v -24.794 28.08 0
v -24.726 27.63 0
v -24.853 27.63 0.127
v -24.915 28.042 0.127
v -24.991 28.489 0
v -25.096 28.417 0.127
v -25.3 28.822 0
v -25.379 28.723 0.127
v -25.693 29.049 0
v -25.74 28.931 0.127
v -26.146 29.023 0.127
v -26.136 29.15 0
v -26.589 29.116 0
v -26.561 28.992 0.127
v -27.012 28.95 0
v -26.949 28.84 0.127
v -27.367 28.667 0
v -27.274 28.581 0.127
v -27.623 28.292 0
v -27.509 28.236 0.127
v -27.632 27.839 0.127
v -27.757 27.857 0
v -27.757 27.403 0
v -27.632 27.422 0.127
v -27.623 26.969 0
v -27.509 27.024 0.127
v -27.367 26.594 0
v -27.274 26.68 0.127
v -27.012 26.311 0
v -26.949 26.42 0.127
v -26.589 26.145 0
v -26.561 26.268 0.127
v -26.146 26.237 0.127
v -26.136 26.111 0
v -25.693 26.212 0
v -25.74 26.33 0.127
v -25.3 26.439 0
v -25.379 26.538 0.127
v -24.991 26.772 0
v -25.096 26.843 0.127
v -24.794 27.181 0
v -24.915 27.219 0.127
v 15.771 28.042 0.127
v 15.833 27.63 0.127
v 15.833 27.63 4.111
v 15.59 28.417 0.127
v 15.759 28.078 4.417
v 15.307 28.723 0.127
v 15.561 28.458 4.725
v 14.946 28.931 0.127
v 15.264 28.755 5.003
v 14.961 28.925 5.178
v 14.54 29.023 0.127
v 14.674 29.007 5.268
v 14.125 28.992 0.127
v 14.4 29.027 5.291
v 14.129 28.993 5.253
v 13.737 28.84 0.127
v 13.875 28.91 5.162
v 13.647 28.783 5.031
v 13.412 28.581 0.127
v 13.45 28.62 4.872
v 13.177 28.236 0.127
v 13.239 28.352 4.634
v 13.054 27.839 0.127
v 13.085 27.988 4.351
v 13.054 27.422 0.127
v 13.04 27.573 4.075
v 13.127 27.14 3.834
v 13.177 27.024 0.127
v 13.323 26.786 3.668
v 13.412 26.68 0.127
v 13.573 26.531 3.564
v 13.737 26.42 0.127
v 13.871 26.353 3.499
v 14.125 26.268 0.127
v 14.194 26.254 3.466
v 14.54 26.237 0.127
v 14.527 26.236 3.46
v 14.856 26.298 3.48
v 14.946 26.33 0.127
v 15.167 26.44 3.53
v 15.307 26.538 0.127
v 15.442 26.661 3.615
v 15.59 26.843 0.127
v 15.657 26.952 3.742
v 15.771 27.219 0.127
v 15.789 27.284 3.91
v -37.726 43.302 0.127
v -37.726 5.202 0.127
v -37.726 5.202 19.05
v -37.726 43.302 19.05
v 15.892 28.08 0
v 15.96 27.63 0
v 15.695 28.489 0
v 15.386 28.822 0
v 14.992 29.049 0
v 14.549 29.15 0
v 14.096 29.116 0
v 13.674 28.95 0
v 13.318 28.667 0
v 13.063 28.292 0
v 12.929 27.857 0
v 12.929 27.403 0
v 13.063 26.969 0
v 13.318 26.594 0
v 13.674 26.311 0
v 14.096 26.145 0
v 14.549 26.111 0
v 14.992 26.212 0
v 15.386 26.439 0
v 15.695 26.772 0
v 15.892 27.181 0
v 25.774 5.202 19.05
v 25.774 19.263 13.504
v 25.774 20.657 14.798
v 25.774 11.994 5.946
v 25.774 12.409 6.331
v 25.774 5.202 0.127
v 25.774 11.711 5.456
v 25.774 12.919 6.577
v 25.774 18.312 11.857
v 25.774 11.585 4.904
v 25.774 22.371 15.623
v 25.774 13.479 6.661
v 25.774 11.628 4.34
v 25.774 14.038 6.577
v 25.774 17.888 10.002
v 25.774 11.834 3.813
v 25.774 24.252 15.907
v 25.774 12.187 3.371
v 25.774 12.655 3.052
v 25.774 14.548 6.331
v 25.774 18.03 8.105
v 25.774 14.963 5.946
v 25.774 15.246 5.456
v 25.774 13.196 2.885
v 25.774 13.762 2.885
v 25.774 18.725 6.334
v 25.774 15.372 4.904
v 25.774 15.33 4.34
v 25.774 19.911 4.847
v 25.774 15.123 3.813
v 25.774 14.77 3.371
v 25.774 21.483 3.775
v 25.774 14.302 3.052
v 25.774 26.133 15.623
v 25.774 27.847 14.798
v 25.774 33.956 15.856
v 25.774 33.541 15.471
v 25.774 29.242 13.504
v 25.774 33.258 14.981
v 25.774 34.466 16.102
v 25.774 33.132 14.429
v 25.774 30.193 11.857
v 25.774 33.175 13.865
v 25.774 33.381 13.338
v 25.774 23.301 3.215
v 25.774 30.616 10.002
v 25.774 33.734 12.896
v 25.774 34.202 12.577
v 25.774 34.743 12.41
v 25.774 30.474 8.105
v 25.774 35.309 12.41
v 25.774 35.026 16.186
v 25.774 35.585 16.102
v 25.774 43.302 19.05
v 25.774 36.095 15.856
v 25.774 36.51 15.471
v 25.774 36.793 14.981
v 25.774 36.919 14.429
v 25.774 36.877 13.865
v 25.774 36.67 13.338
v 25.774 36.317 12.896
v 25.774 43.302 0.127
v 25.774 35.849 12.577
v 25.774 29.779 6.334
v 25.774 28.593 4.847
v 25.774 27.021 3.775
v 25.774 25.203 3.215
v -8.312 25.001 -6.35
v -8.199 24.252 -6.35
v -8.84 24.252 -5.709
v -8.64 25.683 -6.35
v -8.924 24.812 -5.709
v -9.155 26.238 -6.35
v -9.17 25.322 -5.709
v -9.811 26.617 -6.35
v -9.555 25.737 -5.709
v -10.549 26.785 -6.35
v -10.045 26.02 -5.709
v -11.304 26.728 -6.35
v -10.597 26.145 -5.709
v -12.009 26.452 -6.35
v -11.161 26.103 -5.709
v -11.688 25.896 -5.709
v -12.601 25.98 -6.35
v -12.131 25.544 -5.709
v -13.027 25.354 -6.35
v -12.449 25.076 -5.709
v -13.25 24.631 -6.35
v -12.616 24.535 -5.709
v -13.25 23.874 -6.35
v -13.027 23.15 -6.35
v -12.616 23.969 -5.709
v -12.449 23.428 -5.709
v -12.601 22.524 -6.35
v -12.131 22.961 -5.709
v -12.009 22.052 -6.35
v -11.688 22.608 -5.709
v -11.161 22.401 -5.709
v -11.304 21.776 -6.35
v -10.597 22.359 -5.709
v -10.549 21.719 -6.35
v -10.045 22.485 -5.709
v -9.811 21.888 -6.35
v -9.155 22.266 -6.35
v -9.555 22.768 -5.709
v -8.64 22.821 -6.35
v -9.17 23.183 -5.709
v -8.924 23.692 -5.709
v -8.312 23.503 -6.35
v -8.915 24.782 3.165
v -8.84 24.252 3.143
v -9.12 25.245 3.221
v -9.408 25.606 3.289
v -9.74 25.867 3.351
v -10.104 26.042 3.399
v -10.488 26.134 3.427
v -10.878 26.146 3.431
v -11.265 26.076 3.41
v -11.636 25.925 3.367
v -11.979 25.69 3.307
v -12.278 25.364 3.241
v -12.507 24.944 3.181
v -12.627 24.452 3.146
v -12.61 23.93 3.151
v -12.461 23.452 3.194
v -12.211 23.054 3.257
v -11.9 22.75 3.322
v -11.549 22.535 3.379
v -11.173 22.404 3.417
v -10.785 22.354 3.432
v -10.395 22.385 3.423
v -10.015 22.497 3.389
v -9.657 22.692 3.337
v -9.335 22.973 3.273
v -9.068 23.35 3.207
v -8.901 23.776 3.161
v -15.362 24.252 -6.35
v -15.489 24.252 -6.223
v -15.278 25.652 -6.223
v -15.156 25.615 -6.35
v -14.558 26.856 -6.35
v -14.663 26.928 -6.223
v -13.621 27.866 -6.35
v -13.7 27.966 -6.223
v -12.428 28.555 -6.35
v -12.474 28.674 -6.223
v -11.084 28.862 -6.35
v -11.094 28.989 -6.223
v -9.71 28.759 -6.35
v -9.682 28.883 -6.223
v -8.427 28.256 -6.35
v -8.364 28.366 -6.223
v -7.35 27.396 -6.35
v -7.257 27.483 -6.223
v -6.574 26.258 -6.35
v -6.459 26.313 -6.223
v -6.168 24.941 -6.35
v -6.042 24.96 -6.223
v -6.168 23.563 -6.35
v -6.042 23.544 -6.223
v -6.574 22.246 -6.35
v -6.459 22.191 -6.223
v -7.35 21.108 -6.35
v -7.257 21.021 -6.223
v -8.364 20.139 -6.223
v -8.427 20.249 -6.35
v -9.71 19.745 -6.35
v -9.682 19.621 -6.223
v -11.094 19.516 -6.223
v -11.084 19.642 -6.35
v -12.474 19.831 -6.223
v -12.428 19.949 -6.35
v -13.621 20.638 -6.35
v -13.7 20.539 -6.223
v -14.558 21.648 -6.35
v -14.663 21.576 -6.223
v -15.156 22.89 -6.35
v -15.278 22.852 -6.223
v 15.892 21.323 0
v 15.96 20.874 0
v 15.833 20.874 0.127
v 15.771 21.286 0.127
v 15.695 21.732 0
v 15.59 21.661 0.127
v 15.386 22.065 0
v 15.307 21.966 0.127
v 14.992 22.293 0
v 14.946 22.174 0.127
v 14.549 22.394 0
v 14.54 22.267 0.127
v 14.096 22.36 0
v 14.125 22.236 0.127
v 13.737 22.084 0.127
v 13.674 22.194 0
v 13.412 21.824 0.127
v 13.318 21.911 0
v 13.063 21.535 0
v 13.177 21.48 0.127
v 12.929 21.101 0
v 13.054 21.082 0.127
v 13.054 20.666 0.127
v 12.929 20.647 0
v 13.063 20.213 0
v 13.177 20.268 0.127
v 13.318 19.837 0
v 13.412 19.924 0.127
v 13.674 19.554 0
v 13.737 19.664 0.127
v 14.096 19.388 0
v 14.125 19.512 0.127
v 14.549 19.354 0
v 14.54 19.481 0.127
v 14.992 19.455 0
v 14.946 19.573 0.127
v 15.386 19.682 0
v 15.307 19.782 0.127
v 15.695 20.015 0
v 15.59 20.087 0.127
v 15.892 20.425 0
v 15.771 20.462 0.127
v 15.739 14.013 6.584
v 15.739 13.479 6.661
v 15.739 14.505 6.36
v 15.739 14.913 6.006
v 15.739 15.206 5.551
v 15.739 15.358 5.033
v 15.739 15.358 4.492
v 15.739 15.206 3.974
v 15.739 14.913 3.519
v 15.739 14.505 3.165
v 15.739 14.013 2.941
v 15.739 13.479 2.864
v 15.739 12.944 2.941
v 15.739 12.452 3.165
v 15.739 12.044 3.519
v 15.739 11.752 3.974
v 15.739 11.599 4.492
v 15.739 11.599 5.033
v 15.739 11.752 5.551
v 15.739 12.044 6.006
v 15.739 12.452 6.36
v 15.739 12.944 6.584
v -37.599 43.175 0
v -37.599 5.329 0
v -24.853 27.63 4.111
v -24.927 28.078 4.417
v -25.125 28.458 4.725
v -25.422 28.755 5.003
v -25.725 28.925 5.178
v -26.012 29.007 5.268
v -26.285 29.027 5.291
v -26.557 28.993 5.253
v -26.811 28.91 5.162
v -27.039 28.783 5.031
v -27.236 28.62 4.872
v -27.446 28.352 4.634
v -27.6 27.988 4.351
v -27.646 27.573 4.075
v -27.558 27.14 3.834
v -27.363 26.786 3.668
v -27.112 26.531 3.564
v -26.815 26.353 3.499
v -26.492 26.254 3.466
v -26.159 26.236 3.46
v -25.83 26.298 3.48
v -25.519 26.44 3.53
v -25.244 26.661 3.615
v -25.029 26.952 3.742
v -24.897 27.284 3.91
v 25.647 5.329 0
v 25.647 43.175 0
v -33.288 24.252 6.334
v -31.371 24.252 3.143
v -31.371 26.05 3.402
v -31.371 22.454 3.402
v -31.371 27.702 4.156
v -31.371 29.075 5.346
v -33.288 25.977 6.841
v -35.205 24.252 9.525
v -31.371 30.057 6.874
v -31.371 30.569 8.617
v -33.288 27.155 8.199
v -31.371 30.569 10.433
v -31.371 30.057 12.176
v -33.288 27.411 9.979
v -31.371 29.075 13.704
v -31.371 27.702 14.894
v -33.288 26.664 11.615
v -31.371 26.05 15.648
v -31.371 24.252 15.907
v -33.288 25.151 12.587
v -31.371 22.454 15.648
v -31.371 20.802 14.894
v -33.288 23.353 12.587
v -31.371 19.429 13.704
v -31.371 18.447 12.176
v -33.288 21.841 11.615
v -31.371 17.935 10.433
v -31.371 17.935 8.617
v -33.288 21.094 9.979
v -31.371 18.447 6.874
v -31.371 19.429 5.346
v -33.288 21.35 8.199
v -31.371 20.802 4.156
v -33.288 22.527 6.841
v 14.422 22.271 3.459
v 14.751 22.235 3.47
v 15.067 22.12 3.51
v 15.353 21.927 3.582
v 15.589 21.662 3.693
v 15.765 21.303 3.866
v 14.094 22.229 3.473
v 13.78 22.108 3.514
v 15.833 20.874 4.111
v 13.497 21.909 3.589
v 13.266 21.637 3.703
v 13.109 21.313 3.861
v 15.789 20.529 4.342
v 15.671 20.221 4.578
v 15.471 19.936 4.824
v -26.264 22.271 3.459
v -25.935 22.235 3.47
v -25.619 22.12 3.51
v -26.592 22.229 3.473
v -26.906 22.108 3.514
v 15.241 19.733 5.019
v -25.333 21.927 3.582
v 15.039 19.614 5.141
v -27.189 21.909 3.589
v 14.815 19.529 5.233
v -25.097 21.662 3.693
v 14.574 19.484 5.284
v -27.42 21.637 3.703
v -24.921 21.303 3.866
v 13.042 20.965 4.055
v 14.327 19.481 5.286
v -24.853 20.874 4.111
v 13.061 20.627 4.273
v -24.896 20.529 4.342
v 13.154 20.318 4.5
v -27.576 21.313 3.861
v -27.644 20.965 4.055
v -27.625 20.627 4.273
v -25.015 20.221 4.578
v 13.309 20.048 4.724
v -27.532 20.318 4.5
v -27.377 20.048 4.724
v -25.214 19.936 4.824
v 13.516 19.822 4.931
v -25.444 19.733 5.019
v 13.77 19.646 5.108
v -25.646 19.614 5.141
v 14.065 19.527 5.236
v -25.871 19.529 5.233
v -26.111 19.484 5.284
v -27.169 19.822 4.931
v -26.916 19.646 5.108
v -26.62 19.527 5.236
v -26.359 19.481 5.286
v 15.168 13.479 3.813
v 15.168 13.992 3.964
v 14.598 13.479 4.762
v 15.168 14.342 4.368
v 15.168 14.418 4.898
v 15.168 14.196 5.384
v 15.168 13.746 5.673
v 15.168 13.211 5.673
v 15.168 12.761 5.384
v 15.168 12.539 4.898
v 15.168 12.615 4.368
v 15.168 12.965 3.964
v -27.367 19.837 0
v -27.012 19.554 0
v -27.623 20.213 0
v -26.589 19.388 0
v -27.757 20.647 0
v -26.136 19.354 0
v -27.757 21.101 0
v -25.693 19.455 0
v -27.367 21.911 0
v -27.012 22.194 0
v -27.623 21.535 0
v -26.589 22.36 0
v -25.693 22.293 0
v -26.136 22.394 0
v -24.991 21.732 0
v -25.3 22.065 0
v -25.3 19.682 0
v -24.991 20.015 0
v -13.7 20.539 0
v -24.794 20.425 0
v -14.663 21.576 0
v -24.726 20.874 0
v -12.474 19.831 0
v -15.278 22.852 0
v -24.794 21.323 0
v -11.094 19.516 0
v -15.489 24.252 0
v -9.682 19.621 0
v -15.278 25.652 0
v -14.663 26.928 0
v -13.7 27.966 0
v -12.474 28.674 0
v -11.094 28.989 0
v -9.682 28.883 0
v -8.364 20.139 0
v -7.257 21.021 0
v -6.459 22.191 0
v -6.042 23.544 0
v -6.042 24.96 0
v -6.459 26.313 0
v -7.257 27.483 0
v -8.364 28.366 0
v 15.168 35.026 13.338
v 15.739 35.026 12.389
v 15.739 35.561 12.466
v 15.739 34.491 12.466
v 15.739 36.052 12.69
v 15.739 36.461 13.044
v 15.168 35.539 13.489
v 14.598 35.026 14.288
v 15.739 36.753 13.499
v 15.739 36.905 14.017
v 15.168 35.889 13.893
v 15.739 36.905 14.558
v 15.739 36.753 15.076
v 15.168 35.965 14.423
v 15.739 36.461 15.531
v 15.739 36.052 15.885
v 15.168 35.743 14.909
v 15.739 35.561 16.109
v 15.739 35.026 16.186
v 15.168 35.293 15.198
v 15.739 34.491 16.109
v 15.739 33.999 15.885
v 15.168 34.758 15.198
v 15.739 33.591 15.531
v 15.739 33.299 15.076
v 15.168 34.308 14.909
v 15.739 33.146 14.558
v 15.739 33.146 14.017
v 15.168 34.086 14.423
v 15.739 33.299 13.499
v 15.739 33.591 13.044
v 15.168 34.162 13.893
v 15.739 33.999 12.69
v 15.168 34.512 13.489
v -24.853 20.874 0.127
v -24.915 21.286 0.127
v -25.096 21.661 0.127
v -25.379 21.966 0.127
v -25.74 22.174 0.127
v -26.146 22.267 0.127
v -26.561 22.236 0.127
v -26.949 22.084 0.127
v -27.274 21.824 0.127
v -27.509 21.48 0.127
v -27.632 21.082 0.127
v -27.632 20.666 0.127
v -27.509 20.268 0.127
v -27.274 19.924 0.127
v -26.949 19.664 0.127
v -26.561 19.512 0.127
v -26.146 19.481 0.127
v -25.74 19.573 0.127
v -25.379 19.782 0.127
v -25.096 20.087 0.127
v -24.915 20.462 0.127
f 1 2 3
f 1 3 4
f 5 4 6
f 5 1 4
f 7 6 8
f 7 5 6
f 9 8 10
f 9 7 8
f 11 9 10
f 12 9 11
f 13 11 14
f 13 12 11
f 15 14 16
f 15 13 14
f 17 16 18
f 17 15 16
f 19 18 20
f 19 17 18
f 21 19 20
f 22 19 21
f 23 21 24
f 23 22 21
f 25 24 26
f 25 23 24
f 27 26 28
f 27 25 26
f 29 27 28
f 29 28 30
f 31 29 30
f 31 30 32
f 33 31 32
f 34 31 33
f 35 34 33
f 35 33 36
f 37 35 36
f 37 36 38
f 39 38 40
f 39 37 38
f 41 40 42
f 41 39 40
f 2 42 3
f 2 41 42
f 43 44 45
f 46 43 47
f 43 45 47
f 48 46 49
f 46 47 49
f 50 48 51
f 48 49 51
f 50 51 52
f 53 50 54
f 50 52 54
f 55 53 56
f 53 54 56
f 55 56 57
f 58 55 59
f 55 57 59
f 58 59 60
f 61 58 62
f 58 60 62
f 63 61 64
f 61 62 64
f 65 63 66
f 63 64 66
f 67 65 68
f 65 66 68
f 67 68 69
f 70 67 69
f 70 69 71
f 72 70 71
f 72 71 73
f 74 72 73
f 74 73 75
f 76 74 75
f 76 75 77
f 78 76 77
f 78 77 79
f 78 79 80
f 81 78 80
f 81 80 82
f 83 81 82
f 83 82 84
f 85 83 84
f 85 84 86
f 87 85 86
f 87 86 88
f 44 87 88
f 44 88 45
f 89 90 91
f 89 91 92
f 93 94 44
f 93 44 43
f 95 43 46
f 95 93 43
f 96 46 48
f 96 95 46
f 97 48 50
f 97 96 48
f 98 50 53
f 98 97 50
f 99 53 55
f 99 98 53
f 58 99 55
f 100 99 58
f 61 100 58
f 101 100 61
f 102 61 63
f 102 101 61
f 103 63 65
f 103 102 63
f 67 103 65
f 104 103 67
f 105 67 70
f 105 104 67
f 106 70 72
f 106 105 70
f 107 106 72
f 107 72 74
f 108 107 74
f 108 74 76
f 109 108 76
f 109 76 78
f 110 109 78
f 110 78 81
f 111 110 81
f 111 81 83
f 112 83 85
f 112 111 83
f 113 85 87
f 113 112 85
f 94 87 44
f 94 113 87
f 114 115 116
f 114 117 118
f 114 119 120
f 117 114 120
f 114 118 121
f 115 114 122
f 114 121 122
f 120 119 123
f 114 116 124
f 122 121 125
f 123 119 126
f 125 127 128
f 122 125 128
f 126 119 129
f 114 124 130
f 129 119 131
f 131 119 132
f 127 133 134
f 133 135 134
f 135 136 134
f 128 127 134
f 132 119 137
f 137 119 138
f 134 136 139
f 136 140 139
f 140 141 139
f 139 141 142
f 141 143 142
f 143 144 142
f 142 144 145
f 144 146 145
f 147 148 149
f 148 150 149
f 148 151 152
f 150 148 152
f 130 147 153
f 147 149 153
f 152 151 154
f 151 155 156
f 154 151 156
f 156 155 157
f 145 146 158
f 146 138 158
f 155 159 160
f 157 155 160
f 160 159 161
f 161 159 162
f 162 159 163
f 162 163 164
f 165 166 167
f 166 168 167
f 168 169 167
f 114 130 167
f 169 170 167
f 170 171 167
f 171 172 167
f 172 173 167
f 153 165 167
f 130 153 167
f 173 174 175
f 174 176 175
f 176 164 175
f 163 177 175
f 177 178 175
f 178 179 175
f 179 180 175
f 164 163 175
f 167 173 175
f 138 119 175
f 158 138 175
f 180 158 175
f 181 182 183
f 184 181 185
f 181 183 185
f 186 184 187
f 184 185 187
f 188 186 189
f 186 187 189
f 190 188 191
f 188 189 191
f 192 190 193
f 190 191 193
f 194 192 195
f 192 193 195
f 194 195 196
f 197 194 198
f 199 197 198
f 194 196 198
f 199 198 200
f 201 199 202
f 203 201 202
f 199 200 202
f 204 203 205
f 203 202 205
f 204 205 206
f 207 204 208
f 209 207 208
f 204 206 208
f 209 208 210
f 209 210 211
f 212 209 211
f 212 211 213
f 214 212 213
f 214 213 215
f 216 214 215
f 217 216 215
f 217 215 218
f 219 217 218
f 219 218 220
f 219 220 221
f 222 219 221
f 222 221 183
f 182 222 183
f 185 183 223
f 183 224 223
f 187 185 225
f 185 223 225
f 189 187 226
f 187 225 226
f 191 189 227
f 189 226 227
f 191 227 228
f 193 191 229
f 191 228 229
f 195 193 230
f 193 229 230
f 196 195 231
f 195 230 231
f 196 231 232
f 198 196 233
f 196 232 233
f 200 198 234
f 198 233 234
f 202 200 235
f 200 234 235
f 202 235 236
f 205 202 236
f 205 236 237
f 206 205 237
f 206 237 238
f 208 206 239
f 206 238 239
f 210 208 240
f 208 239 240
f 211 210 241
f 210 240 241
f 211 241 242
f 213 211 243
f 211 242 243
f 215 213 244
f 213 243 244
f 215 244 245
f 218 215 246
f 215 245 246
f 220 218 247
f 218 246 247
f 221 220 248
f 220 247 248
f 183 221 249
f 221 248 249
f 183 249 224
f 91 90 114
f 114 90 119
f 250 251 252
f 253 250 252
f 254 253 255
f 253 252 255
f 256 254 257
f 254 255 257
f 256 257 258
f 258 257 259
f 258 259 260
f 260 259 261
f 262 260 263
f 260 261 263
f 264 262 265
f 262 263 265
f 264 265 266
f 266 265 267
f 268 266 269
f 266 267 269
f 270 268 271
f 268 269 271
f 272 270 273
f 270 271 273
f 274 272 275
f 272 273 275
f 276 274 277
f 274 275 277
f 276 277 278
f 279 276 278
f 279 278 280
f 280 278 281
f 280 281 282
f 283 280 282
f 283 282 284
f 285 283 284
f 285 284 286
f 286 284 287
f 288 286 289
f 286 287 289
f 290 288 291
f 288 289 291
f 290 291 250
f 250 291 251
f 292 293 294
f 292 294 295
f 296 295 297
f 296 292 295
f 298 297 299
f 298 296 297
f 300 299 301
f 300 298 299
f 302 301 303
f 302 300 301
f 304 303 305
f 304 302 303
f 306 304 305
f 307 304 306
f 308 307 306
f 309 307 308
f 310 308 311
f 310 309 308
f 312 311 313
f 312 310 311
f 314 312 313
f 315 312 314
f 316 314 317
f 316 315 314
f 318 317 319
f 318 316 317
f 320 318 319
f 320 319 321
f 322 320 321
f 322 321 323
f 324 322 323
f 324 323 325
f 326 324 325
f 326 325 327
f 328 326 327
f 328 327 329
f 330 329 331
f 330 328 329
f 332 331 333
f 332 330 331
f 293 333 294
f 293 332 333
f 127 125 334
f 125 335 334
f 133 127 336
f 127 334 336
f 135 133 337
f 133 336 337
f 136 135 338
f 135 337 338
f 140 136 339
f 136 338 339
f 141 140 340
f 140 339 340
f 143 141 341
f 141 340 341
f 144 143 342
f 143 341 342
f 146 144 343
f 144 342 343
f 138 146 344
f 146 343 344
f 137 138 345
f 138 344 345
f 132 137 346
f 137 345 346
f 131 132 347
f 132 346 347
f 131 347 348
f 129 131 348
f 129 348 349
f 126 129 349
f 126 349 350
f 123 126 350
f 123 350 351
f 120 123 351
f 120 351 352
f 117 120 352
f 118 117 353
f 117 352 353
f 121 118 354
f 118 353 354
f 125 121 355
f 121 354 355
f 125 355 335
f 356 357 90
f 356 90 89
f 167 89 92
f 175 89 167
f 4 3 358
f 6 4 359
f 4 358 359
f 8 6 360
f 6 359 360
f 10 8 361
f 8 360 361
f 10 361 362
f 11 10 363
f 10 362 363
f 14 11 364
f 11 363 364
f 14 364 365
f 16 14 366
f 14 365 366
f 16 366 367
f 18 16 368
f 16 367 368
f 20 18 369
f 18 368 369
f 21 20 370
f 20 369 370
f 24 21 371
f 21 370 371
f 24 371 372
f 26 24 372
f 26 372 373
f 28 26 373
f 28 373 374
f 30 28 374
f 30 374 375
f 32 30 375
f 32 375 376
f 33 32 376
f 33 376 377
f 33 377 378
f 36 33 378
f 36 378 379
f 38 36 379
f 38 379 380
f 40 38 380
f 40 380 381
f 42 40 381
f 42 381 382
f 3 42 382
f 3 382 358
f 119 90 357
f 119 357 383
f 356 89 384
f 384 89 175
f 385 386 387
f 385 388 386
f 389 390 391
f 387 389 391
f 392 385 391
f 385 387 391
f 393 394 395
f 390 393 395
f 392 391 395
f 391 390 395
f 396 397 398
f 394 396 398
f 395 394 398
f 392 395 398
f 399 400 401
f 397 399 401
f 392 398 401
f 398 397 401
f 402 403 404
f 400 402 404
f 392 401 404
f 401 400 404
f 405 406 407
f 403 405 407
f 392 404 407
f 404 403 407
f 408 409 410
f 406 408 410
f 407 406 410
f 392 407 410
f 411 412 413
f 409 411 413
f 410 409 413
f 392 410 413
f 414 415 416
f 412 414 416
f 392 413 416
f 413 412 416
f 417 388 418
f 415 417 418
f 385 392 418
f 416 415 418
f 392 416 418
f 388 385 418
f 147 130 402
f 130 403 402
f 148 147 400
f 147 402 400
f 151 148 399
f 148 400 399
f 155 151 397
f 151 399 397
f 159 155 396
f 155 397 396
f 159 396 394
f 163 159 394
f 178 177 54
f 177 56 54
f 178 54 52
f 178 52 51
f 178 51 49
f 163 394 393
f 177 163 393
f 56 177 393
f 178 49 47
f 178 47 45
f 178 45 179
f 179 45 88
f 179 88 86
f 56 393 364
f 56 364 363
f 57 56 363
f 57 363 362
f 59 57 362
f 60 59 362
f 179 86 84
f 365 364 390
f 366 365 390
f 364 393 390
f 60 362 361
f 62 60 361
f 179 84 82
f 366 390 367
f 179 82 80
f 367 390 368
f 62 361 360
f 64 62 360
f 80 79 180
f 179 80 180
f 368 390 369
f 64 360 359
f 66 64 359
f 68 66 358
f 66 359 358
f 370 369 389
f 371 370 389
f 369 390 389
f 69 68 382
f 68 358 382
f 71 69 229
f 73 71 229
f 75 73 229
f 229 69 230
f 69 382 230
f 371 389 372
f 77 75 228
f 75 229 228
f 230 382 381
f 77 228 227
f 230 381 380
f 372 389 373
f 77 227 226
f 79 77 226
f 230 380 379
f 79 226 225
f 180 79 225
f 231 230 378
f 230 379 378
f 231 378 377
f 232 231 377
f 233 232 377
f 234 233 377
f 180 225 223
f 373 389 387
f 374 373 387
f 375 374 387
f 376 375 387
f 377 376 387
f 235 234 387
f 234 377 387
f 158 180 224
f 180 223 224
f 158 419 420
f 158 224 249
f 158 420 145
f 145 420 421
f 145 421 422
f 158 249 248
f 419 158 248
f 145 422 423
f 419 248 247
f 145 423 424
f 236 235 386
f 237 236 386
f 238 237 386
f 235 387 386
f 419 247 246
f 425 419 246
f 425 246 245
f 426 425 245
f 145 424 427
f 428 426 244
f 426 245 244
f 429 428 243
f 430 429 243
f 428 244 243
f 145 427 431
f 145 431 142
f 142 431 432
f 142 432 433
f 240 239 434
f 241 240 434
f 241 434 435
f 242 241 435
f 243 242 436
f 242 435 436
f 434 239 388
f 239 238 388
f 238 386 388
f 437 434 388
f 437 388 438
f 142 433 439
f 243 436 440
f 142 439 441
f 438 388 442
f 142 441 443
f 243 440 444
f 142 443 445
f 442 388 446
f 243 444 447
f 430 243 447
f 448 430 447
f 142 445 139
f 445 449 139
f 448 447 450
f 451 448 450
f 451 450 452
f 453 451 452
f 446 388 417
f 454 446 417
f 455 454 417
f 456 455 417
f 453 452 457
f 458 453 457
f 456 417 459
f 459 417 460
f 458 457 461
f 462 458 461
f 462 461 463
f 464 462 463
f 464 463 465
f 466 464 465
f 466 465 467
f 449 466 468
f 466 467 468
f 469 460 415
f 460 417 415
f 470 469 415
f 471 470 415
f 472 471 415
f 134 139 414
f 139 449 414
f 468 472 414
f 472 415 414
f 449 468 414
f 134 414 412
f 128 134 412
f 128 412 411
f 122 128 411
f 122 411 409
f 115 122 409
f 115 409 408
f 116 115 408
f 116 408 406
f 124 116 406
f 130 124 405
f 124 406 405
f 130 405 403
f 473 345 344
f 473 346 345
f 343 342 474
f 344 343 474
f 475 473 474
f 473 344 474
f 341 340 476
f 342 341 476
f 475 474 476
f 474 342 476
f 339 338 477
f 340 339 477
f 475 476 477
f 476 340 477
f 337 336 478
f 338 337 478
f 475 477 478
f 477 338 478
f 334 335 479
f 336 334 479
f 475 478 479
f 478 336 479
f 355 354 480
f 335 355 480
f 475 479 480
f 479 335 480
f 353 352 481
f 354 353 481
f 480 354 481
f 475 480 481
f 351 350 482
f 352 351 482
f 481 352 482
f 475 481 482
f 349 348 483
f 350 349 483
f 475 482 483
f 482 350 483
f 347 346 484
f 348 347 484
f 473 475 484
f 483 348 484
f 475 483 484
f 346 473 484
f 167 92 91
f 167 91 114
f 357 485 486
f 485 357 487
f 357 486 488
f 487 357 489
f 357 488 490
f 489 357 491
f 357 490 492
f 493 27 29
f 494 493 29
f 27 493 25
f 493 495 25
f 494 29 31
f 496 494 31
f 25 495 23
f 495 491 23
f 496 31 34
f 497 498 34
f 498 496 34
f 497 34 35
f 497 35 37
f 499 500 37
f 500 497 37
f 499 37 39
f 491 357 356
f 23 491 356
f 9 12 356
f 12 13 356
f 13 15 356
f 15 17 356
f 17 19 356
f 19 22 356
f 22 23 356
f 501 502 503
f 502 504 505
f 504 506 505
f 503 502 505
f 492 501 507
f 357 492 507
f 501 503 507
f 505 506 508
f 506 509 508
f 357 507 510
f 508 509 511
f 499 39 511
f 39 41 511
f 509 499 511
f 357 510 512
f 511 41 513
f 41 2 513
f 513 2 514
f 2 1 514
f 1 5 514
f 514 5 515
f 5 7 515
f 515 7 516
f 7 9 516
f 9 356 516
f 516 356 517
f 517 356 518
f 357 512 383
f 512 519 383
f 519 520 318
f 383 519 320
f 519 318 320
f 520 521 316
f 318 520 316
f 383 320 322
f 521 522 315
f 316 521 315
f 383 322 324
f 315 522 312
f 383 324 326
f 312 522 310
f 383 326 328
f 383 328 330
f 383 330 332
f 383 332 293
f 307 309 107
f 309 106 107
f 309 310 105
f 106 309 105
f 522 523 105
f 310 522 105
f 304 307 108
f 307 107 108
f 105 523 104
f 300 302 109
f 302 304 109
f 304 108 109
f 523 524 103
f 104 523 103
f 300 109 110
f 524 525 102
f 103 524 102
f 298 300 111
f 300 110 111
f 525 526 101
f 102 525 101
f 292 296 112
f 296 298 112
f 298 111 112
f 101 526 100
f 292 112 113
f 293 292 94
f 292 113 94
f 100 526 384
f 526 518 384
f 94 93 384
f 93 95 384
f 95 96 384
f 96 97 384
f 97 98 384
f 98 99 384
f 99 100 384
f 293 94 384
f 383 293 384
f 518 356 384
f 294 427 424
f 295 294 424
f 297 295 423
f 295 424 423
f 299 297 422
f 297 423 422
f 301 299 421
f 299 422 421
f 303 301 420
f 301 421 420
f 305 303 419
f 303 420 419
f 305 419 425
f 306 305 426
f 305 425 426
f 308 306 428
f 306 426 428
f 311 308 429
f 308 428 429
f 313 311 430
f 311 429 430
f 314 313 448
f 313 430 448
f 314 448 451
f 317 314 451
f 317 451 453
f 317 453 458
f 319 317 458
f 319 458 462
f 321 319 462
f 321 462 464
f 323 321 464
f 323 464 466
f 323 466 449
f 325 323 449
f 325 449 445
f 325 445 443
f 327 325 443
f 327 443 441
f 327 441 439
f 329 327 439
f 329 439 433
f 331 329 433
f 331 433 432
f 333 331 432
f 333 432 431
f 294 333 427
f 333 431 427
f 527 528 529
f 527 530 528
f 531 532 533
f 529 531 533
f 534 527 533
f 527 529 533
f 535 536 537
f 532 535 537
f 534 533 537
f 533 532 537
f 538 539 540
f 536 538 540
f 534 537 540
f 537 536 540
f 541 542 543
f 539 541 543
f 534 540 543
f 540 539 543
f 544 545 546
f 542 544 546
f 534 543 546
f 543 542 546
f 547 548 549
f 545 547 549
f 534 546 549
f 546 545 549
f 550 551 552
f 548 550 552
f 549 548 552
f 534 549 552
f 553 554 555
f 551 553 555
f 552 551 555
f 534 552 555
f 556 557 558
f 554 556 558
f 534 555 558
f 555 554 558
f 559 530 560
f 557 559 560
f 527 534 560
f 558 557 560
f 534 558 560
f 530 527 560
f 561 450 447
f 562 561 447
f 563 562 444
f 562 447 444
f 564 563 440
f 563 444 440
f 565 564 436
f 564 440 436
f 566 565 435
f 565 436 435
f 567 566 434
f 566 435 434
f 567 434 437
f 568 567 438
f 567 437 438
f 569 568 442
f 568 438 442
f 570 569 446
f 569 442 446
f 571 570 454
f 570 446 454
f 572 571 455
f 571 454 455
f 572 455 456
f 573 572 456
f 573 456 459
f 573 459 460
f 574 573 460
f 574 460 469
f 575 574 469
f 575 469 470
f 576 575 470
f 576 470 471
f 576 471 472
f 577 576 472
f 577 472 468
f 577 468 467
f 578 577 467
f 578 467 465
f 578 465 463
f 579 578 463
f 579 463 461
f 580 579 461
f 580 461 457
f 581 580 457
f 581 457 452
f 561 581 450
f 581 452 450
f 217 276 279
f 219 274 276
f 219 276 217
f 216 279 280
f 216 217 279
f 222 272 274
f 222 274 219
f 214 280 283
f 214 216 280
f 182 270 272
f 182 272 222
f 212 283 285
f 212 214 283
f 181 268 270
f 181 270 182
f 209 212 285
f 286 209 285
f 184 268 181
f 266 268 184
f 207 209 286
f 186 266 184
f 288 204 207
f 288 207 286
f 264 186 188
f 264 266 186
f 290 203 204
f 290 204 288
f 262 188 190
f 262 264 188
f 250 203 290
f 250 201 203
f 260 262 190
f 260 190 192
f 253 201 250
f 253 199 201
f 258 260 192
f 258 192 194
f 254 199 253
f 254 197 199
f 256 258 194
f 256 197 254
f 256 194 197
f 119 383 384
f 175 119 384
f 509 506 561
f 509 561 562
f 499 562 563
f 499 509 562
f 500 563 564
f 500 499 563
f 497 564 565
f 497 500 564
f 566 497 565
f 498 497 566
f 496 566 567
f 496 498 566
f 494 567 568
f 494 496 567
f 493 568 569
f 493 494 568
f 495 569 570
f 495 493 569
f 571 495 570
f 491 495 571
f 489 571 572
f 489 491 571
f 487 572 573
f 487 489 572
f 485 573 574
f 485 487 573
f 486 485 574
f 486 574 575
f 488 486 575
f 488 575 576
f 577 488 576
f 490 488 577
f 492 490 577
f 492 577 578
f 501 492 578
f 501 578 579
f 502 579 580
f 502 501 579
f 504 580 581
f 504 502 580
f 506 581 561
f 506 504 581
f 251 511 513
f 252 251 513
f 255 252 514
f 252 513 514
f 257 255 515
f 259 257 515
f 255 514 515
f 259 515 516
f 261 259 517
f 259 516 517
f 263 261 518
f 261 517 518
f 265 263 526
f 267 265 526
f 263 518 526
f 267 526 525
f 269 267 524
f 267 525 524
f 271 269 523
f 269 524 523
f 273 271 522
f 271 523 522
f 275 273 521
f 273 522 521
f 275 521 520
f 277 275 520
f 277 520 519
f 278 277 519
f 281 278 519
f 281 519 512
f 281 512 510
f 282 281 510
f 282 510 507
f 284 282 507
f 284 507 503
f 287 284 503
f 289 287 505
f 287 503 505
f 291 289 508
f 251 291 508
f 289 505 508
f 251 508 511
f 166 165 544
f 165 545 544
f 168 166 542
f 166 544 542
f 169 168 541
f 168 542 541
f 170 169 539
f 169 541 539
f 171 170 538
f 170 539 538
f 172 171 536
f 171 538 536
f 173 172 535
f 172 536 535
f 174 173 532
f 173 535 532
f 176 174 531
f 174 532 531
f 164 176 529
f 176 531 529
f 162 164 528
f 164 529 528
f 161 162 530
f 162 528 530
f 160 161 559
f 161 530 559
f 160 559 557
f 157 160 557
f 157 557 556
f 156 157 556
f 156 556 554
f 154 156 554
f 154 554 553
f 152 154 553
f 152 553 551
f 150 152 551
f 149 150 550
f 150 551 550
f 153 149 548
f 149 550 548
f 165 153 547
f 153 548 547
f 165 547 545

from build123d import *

# Parameters (mm, degrees)
SKETCH1_W                         = 63.5
SKETCH1_H                         = 38.1
BOSS_EXTRUDE1_DEPTH               = 19.05
F_1_2_0_5025_DIAMETER_HOLE1_D     = 12.7635
F_1_2_0_5025_DIAMETER_HOLE1_DEPTH = 57.144535069
F_1_2_0_5025_DIAMETER_HOLE1_TIP   = 3.834542255
F_35_0_11_DIAMETER_HOLE1_D        = 2.794
F_35_0_11_DIAMETER_HOLE1_DEPTH    = 9.652
F_35_0_11_DIAMETER_HOLE1_TIP      = 0.839402285
F_10_24_TAPPED_HOLE1_D            = 3.7973
F_10_24_TAPPED_HOLE1_DEPTH        = 10.035175986
F_10_24_TAPPED_HOLE1_TIP          = 1.140824014
SKETCH9_R                         = 4.7498
BOSS_EXTRUDE2_DEPTH               = 6.35
F_10_24_TAPPED_HOLE2_D            = 3.7973
F_10_24_TAPPED_HOLE2_DEPTH        = 10.414
F_10_24_TAPPED_HOLE2_CSINK_D      = 5.08
F_10_24_TAPPED_HOLE2_CSINK_ANGLE  = 90
F_10_24_TAPPED_HOLE2_TIP          = 1.140824014
CHAMFER1_SIZE                     = 0.127


with BuildPart() as part:
    # Sketch1 → Boss-Extrude1 (new body)
    with BuildSketch(Plane.XY):
        with Locations((-5.976242834, 24.252126053)):
            Rectangle(SKETCH1_W, SKETCH1_H)
    extrude(amount=BOSS_EXTRUDE1_DEPTH)

    # 1/2 (0.5025) Diameter Hole1
    with Locations(Plane(origin=(25.773757166, 0, 0), x_dir=(0, 0, -1), z_dir=(1, 0, 0))):
        with Locations((-9.525, 24.252126053)):
            Hole(F_1_2_0_5025_DIAMETER_HOLE1_D / 2, depth=F_1_2_0_5025_DIAMETER_HOLE1_DEPTH)
            with Locations((0, 0, -(F_1_2_0_5025_DIAMETER_HOLE1_DEPTH + F_1_2_0_5025_DIAMETER_HOLE1_TIP / 2))):  # 118° drill point
                Cone(0, F_1_2_0_5025_DIAMETER_HOLE1_D / 2, F_1_2_0_5025_DIAMETER_HOLE1_TIP, mode=Mode.SUBTRACT)

    # #35 (0.11) Diameter Hole1
    with Locations(Plane(origin=(0, 0, 0), x_dir=(-1, 0, 0), z_dir=(0, 0, -1))):
        with Locations((26.250138314, 20.873926053), (26.250138314, 27.630326053), (-14.435604522, 27.630326053), (-14.435604522, 20.873926053)):
            Hole(F_35_0_11_DIAMETER_HOLE1_D / 2, depth=F_35_0_11_DIAMETER_HOLE1_DEPTH)
            with Locations((0, 0, -(F_35_0_11_DIAMETER_HOLE1_DEPTH + F_35_0_11_DIAMETER_HOLE1_TIP / 2))):  # 118° drill point
                Cone(0, F_35_0_11_DIAMETER_HOLE1_D / 2, F_35_0_11_DIAMETER_HOLE1_TIP, mode=Mode.SUBTRACT)

    # #10-24 Tapped Hole1
    with Locations(Plane(origin=(25.773757166, 0, 0), x_dir=(0, 0, -1), z_dir=(1, 0, 0))):
        with Locations((-4.7625, 13.478578619), (-14.2875, 35.025673487)):
            Hole(F_10_24_TAPPED_HOLE1_D / 2, depth=F_10_24_TAPPED_HOLE1_DEPTH)
            with Locations((0, 0, -(F_10_24_TAPPED_HOLE1_DEPTH + F_10_24_TAPPED_HOLE1_TIP / 2))):  # 118° drill point
                Cone(0, F_10_24_TAPPED_HOLE1_D / 2, F_10_24_TAPPED_HOLE1_TIP, mode=Mode.SUBTRACT)

    # Sketch9 → Boss-Extrude2 (add)
    with BuildSketch(Plane(origin=(0, 0, 0), x_dir=(-1, 0, 0), z_dir=(0, 0, -1))):
        with Locations((10.738742834, 24.252126053)):
            Circle(SKETCH9_R)
    extrude(amount=BOSS_EXTRUDE2_DEPTH)

    # #10-24 Tapped Hole2
    with Locations(Plane(origin=(0, 0, -6.35), x_dir=(-1, 0, 0), z_dir=(0, 0, -1))):
        with Locations((10.738742834, 24.252126053)):
            CounterSinkHole(F_10_24_TAPPED_HOLE2_D / 2, F_10_24_TAPPED_HOLE2_CSINK_D / 2, depth=F_10_24_TAPPED_HOLE2_DEPTH, counter_sink_angle=F_10_24_TAPPED_HOLE2_CSINK_ANGLE)
            with Locations((0, 0, -(F_10_24_TAPPED_HOLE2_DEPTH + F_10_24_TAPPED_HOLE2_TIP / 2))):  # 118° drill point
                Cone(0, F_10_24_TAPPED_HOLE2_D / 2, F_10_24_TAPPED_HOLE2_TIP, mode=Mode.SUBTRACT)

    # Chamfer1
    chamfer1_edges = [part.edges().sort_by_distance(p)[0] for p in [
        (13.038604522, 20.873926053, 0),
        (13.038604522, 27.630326053, 0),
        (-27.647138314, 27.630326053, 0),
        (-27.647138314, 20.873926053, 0),
        (-37.726242834, 24.252126053, 0),
        (-5.976242834, 43.302126053, 0),
        (-5.988942834, 24.252126053, -6.35),
        (25.773757166, 24.252126053, 0),
        (-5.976242834, 5.202126053, 0),
    ]]
    chamfer(chamfer1_edges, length=CHAMFER1_SIZE)


solid = part.part
